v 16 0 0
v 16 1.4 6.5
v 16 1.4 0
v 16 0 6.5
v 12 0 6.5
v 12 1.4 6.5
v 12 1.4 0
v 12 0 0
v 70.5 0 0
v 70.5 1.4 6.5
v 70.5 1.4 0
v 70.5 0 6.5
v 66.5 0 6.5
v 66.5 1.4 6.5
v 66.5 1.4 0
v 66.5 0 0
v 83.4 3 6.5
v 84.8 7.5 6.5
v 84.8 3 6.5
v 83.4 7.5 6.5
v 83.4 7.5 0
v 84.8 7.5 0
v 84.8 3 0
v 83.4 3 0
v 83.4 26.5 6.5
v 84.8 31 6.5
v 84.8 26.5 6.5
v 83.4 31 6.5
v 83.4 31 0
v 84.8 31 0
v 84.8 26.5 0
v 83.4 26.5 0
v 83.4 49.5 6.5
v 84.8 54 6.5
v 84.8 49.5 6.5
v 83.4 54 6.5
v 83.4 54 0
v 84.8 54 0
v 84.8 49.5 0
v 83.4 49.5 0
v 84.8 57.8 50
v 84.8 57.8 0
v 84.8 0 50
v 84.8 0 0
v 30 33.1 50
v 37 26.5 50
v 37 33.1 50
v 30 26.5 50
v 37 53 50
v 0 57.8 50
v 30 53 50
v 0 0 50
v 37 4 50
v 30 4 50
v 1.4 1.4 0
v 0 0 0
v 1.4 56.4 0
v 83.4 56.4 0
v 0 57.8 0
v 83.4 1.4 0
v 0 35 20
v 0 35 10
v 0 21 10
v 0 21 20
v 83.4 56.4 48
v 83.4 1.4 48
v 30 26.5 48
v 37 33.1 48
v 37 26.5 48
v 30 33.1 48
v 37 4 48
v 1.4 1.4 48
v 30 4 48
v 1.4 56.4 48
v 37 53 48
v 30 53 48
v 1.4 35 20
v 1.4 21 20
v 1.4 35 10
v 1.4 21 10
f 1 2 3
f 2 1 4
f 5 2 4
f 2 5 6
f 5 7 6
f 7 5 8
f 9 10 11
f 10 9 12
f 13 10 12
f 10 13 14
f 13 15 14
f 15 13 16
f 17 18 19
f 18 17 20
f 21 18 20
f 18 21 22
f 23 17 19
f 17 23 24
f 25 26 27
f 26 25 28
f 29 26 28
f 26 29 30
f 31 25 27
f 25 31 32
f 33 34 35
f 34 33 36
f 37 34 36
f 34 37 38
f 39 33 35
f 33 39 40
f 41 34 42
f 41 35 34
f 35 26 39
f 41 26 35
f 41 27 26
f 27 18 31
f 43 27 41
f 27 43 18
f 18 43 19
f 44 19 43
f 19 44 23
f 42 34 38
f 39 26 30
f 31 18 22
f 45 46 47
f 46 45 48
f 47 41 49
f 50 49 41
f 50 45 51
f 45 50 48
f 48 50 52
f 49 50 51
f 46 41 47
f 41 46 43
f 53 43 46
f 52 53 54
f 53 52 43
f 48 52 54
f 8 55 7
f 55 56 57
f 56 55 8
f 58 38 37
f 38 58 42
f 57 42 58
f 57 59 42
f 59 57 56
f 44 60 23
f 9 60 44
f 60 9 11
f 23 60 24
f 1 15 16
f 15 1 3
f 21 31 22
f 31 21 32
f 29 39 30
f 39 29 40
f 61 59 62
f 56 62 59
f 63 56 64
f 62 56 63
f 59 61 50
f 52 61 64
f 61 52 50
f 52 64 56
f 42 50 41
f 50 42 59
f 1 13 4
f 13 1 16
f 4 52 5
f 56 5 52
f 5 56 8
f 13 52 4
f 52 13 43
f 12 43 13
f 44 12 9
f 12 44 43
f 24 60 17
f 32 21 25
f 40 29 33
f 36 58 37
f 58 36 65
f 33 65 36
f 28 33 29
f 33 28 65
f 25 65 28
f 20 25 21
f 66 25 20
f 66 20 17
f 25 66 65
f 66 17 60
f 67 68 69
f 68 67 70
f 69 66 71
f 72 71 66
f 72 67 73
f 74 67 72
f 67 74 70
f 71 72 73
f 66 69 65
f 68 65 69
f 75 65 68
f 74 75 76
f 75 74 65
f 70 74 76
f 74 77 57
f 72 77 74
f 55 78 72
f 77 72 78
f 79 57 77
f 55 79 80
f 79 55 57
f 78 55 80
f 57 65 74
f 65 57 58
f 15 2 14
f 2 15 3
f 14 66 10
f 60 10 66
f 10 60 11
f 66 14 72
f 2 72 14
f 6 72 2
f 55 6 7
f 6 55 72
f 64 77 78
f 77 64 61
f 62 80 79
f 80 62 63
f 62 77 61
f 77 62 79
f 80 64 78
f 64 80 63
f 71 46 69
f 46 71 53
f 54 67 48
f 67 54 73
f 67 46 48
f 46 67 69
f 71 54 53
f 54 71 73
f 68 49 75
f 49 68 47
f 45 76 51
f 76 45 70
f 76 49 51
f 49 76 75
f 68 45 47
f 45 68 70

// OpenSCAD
//Breadboard itself (no feet) is 82mm x 55mm x 10mm
wallThickness = 2;
printTolerance = 0.8;

boardLength = 82;
boardWidth = 55;
boardHeight = 10;

coverHeight = 50;

//outer shell
difference(){
    cube([boardLength + wallThickness + printTolerance, boardWidth + wallThickness + printTolerance, coverHeight]);
    
    translate([(wallThickness + printTolerance)/2, (wallThickness + printTolerance)/2,-10])cube([boardLength, boardWidth, coverHeight-wallThickness+10]);
    holeFeet();
    usbHole();
    ccs811MountHole();
    bme680MountHole();
};

//feet holes for the breadboard

holeBlockWidth = wallThickness + 1 + 1;
holeWidth = 4.5;
holeHeight = 6.5;



module holeFeet(){
    //lengthwise holes
    //12-16mm
    translate([12,-1,-1])cube([holeBlockWidth, holeWidth ,holeHeight + 1]);

    //66.5-70.5mm
    translate([66.5,-1,-1])cube([holeBlockWidth, holeWidth ,holeHeight + 1]);



    //widthwise holes
    //3-7mm
    translate([boardLength, 3,-1])cube([holeBlockWidth, holeWidth ,holeHeight + 1]);

    //25.5-29.5mm
    translate([boardLength, 26.5,-1])cube([holeBlockWidth, holeWidth ,holeHeight + 1]);

    //48.5mm to 51.5
    translate([boardLength, 49.5,-1])cube([holeBlockWidth, holeWidth ,holeHeight + 1]);
}

//USB port
//21-35mm wide, and 10-20mm high
usbHoleHeight = 10;
usbHoleWidth = 14;
usbBaseHeight = 10;

module usbHole(){
    translate([-1 , 21 , usbBaseHeight])cube([holeBlockWidth, usbHoleWidth, usbHoleHeight]);
}


//Holes for mounting the sensors.
ccs811ScrewHole = 1.8; //holes are 2.54mm
ccs811Width = 22.5;     //has tolerance
ccs811Height = 7;




module ccs811MountHole(){
    translate([30,wallThickness +2,coverHeight-((wallThickness+4)/2)])cube([ccs811Height, ccs811Width, wallThickness + 5]);
}


bme680ScrewHole = 1.5; //2.286mm
bme680Width = 19.9;
bme680Height = 7;


module bme680MountHole(){
    translate([30,boardWidth-bme680Width-2,coverHeight-((wallThickness+4)/2)])cube([bme680Height, bme680Width, wallThickness + 5]);
}
